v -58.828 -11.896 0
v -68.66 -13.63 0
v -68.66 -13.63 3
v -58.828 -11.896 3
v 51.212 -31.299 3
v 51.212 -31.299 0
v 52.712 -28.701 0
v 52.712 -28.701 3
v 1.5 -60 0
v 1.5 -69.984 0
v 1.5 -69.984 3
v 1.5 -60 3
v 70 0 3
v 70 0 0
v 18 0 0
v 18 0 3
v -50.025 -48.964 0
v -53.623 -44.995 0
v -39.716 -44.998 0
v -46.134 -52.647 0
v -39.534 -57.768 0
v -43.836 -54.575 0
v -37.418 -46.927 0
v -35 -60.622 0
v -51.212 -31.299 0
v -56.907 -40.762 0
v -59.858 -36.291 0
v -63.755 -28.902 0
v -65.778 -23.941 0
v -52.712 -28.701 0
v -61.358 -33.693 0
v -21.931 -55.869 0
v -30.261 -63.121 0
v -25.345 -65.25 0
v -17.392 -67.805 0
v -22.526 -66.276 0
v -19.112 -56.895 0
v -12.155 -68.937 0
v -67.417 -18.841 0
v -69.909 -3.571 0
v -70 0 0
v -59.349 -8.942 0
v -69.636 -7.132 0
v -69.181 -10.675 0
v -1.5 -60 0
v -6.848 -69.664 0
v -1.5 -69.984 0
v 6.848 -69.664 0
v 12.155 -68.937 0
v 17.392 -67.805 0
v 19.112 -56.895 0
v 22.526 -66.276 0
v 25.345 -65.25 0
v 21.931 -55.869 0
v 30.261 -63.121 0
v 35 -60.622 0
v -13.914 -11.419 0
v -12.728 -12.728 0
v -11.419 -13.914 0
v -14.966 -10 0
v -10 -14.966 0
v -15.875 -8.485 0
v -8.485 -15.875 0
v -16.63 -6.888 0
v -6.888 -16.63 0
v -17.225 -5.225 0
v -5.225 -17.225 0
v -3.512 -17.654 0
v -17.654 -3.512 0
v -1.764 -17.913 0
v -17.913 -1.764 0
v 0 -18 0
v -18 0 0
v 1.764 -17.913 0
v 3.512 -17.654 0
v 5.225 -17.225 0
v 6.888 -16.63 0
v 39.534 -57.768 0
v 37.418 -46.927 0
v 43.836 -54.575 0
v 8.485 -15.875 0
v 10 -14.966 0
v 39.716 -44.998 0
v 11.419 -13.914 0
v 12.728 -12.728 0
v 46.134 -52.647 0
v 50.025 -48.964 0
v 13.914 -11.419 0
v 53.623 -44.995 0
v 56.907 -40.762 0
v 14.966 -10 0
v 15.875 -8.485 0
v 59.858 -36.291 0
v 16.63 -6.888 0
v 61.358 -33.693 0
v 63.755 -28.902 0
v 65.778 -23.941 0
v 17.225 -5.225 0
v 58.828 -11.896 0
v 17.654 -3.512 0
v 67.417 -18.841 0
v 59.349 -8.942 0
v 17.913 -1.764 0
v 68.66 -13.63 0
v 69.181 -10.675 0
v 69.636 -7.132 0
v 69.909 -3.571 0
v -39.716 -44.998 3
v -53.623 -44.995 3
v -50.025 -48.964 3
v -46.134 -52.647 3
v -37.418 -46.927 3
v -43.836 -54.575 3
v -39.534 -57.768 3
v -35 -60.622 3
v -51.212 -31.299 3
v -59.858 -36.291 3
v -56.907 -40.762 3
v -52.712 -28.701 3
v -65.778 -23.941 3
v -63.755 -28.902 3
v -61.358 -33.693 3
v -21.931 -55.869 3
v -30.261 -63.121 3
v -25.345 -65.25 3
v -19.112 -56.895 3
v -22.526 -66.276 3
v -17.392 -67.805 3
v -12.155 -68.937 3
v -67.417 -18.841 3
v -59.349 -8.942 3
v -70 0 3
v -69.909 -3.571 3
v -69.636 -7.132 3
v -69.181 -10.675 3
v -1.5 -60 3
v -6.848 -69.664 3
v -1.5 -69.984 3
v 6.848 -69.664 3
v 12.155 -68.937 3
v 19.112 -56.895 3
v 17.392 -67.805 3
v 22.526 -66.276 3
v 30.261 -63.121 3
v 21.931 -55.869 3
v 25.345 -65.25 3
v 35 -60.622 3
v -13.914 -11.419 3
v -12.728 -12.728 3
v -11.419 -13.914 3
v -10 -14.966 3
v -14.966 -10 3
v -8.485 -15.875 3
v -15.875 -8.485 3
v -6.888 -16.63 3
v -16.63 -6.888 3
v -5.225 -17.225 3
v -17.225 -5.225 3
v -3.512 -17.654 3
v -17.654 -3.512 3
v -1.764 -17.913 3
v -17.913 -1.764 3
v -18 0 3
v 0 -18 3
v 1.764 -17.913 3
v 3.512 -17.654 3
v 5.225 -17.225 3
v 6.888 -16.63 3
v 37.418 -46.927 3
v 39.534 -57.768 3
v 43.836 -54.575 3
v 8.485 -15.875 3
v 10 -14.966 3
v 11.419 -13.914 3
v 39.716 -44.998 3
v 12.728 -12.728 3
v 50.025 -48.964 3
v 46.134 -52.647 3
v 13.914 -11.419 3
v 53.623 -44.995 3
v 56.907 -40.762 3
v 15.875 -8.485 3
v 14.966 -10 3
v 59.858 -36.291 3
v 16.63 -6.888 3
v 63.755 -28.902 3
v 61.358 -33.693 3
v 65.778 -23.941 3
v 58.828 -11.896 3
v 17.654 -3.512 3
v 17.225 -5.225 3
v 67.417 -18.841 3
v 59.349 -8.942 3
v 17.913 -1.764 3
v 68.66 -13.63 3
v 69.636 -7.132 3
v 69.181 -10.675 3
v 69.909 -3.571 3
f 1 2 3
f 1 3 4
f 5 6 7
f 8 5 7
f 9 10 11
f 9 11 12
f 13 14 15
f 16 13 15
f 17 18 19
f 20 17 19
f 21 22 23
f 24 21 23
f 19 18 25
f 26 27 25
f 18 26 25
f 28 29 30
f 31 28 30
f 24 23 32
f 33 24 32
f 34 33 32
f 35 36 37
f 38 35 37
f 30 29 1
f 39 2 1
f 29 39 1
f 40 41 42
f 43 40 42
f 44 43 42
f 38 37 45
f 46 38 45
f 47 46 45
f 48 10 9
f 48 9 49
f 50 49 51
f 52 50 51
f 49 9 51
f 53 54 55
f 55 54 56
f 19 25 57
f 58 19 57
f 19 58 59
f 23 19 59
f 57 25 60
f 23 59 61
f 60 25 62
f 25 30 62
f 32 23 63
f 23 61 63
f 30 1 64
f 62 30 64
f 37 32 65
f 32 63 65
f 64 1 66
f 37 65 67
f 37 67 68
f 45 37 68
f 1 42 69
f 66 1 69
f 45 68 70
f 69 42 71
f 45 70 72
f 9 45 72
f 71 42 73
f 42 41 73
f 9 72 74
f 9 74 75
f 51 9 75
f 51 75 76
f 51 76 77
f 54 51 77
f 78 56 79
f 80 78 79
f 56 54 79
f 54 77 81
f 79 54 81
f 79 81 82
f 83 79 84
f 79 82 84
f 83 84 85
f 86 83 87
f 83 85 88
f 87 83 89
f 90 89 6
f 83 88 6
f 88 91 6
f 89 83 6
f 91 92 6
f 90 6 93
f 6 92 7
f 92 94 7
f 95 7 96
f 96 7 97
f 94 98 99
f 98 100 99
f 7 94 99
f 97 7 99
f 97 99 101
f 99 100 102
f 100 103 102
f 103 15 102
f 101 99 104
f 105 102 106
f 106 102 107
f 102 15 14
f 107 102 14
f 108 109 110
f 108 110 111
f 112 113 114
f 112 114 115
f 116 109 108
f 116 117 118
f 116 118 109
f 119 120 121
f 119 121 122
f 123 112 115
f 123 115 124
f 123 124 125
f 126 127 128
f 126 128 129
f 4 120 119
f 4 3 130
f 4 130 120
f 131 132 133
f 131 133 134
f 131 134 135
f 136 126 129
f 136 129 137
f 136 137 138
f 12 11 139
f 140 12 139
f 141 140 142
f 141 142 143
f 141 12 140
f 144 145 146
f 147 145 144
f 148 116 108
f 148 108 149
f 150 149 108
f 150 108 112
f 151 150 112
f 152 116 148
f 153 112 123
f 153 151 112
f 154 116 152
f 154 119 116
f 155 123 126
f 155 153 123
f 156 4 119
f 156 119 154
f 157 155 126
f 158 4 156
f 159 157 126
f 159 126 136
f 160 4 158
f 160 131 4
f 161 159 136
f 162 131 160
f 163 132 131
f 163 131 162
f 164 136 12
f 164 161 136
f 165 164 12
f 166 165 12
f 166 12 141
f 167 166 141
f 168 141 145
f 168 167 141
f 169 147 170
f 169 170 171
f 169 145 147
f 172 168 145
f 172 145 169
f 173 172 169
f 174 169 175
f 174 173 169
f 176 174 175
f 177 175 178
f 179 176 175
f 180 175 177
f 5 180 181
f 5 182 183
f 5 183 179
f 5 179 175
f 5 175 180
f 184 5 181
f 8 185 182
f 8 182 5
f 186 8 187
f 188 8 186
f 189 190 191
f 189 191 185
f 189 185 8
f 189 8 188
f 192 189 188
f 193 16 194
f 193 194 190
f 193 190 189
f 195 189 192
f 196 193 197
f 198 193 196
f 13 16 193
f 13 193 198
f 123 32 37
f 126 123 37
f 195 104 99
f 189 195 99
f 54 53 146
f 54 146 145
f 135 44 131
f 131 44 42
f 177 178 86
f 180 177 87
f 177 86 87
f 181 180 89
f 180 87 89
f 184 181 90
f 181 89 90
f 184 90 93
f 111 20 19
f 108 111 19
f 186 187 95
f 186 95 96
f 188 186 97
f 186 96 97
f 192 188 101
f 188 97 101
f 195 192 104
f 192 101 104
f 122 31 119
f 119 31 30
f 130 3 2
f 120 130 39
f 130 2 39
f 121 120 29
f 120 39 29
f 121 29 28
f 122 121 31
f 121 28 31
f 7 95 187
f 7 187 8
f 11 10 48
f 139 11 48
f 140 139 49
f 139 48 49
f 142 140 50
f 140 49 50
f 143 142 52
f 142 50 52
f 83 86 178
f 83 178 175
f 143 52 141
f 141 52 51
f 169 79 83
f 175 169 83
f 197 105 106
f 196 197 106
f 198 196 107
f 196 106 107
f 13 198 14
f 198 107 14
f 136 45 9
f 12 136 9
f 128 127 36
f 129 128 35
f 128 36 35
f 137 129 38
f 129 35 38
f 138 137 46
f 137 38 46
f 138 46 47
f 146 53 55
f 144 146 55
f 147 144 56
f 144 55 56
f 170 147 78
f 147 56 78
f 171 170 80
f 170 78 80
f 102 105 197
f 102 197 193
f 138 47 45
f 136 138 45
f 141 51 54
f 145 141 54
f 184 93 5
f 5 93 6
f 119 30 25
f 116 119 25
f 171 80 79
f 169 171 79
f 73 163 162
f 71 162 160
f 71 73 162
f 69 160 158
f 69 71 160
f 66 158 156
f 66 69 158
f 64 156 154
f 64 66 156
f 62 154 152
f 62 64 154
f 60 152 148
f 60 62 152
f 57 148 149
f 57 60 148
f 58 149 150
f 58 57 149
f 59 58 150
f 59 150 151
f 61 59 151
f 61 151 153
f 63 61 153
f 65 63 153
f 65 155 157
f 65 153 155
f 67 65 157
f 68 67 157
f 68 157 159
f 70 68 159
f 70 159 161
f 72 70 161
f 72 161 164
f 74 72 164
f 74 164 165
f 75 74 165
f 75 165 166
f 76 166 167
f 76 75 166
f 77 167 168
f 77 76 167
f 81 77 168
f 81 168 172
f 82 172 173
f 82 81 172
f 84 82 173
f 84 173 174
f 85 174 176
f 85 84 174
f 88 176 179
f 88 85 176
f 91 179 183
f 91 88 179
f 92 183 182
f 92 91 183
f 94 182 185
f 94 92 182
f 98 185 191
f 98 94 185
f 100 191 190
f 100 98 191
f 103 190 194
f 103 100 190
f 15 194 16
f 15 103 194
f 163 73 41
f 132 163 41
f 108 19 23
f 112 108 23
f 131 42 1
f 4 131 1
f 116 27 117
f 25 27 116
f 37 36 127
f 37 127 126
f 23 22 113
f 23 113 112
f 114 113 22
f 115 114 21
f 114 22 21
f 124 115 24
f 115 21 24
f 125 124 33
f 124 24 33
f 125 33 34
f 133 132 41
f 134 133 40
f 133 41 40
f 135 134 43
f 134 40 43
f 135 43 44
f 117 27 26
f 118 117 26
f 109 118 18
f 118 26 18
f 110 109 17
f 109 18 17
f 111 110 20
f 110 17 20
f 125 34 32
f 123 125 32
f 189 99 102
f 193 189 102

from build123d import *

# Parameters (mm, degrees)
BOSS_EXTRUDE1_DEPTH             = 3
SKETCH5_W                       = 3
SKETCH5_H                       = 10
CUT_EXTRUDE2_DEPTH              = 100.040395799
CIRPATTERN1_COUNT               = 5
CIRPATTERN1_ANGLE               = 80
CIRPATTERN1_THE_OTHER_WAY_COUNT = 5
CIRPATTERN1_THE_OTHER_WAY_ANGLE = 80
SKETCH6_R                       = 18
CUT_EXTRUDE3_DEPTH              = 100.029036146


with BuildPart() as part:
    # Sketch4 → Boss-Extrude1 (new body)
    with BuildSketch(Plane.XY):
        with BuildLine():
            Line((70, 0), (-70, 0))
            ThreePointArc((-70, 0), (0, -70), (70, 0))
        make_face()
    extrude(amount=BOSS_EXTRUDE1_DEPTH)

    # Sketch5 → Cut-Extrude2 (cut, through all)
    with BuildSketch(Plane.XY):
        with Locations((0, -65)):
            Rectangle(SKETCH5_W, SKETCH5_H)
    cut_extrude2 = extrude(amount=CUT_EXTRUDE2_DEPTH, mode=Mode.SUBTRACT)

    # CirPattern1: Cut-Extrude2 ×5 about axis
    cirpattern1_axis = Axis((0, 0, 3), (0, 0, -1))
    for i in range(1, CIRPATTERN1_COUNT):
        add(cut_extrude2.rotate(cirpattern1_axis, i * CIRPATTERN1_ANGLE / (CIRPATTERN1_COUNT - 1)), mode=Mode.SUBTRACT)

    # CirPattern1 the other way: Cut-Extrude2 ×5 about axis
    cirpattern1_the_other_way_axis = Axis((0, 0, 3), (0, 0, 1))
    for i in range(1, CIRPATTERN1_THE_OTHER_WAY_COUNT):
        add(cut_extrude2.rotate(cirpattern1_the_other_way_axis, i * CIRPATTERN1_THE_OTHER_WAY_ANGLE / (CIRPATTERN1_THE_OTHER_WAY_COUNT - 1)), mode=Mode.SUBTRACT)

    # Sketch6 → Cut-Extrude3 (cut, through all)
    with BuildSketch(Plane.XY):
        Circle(SKETCH6_R)
    extrude(amount=CUT_EXTRUDE3_DEPTH, mode=Mode.SUBTRACT)


solid = part.part
